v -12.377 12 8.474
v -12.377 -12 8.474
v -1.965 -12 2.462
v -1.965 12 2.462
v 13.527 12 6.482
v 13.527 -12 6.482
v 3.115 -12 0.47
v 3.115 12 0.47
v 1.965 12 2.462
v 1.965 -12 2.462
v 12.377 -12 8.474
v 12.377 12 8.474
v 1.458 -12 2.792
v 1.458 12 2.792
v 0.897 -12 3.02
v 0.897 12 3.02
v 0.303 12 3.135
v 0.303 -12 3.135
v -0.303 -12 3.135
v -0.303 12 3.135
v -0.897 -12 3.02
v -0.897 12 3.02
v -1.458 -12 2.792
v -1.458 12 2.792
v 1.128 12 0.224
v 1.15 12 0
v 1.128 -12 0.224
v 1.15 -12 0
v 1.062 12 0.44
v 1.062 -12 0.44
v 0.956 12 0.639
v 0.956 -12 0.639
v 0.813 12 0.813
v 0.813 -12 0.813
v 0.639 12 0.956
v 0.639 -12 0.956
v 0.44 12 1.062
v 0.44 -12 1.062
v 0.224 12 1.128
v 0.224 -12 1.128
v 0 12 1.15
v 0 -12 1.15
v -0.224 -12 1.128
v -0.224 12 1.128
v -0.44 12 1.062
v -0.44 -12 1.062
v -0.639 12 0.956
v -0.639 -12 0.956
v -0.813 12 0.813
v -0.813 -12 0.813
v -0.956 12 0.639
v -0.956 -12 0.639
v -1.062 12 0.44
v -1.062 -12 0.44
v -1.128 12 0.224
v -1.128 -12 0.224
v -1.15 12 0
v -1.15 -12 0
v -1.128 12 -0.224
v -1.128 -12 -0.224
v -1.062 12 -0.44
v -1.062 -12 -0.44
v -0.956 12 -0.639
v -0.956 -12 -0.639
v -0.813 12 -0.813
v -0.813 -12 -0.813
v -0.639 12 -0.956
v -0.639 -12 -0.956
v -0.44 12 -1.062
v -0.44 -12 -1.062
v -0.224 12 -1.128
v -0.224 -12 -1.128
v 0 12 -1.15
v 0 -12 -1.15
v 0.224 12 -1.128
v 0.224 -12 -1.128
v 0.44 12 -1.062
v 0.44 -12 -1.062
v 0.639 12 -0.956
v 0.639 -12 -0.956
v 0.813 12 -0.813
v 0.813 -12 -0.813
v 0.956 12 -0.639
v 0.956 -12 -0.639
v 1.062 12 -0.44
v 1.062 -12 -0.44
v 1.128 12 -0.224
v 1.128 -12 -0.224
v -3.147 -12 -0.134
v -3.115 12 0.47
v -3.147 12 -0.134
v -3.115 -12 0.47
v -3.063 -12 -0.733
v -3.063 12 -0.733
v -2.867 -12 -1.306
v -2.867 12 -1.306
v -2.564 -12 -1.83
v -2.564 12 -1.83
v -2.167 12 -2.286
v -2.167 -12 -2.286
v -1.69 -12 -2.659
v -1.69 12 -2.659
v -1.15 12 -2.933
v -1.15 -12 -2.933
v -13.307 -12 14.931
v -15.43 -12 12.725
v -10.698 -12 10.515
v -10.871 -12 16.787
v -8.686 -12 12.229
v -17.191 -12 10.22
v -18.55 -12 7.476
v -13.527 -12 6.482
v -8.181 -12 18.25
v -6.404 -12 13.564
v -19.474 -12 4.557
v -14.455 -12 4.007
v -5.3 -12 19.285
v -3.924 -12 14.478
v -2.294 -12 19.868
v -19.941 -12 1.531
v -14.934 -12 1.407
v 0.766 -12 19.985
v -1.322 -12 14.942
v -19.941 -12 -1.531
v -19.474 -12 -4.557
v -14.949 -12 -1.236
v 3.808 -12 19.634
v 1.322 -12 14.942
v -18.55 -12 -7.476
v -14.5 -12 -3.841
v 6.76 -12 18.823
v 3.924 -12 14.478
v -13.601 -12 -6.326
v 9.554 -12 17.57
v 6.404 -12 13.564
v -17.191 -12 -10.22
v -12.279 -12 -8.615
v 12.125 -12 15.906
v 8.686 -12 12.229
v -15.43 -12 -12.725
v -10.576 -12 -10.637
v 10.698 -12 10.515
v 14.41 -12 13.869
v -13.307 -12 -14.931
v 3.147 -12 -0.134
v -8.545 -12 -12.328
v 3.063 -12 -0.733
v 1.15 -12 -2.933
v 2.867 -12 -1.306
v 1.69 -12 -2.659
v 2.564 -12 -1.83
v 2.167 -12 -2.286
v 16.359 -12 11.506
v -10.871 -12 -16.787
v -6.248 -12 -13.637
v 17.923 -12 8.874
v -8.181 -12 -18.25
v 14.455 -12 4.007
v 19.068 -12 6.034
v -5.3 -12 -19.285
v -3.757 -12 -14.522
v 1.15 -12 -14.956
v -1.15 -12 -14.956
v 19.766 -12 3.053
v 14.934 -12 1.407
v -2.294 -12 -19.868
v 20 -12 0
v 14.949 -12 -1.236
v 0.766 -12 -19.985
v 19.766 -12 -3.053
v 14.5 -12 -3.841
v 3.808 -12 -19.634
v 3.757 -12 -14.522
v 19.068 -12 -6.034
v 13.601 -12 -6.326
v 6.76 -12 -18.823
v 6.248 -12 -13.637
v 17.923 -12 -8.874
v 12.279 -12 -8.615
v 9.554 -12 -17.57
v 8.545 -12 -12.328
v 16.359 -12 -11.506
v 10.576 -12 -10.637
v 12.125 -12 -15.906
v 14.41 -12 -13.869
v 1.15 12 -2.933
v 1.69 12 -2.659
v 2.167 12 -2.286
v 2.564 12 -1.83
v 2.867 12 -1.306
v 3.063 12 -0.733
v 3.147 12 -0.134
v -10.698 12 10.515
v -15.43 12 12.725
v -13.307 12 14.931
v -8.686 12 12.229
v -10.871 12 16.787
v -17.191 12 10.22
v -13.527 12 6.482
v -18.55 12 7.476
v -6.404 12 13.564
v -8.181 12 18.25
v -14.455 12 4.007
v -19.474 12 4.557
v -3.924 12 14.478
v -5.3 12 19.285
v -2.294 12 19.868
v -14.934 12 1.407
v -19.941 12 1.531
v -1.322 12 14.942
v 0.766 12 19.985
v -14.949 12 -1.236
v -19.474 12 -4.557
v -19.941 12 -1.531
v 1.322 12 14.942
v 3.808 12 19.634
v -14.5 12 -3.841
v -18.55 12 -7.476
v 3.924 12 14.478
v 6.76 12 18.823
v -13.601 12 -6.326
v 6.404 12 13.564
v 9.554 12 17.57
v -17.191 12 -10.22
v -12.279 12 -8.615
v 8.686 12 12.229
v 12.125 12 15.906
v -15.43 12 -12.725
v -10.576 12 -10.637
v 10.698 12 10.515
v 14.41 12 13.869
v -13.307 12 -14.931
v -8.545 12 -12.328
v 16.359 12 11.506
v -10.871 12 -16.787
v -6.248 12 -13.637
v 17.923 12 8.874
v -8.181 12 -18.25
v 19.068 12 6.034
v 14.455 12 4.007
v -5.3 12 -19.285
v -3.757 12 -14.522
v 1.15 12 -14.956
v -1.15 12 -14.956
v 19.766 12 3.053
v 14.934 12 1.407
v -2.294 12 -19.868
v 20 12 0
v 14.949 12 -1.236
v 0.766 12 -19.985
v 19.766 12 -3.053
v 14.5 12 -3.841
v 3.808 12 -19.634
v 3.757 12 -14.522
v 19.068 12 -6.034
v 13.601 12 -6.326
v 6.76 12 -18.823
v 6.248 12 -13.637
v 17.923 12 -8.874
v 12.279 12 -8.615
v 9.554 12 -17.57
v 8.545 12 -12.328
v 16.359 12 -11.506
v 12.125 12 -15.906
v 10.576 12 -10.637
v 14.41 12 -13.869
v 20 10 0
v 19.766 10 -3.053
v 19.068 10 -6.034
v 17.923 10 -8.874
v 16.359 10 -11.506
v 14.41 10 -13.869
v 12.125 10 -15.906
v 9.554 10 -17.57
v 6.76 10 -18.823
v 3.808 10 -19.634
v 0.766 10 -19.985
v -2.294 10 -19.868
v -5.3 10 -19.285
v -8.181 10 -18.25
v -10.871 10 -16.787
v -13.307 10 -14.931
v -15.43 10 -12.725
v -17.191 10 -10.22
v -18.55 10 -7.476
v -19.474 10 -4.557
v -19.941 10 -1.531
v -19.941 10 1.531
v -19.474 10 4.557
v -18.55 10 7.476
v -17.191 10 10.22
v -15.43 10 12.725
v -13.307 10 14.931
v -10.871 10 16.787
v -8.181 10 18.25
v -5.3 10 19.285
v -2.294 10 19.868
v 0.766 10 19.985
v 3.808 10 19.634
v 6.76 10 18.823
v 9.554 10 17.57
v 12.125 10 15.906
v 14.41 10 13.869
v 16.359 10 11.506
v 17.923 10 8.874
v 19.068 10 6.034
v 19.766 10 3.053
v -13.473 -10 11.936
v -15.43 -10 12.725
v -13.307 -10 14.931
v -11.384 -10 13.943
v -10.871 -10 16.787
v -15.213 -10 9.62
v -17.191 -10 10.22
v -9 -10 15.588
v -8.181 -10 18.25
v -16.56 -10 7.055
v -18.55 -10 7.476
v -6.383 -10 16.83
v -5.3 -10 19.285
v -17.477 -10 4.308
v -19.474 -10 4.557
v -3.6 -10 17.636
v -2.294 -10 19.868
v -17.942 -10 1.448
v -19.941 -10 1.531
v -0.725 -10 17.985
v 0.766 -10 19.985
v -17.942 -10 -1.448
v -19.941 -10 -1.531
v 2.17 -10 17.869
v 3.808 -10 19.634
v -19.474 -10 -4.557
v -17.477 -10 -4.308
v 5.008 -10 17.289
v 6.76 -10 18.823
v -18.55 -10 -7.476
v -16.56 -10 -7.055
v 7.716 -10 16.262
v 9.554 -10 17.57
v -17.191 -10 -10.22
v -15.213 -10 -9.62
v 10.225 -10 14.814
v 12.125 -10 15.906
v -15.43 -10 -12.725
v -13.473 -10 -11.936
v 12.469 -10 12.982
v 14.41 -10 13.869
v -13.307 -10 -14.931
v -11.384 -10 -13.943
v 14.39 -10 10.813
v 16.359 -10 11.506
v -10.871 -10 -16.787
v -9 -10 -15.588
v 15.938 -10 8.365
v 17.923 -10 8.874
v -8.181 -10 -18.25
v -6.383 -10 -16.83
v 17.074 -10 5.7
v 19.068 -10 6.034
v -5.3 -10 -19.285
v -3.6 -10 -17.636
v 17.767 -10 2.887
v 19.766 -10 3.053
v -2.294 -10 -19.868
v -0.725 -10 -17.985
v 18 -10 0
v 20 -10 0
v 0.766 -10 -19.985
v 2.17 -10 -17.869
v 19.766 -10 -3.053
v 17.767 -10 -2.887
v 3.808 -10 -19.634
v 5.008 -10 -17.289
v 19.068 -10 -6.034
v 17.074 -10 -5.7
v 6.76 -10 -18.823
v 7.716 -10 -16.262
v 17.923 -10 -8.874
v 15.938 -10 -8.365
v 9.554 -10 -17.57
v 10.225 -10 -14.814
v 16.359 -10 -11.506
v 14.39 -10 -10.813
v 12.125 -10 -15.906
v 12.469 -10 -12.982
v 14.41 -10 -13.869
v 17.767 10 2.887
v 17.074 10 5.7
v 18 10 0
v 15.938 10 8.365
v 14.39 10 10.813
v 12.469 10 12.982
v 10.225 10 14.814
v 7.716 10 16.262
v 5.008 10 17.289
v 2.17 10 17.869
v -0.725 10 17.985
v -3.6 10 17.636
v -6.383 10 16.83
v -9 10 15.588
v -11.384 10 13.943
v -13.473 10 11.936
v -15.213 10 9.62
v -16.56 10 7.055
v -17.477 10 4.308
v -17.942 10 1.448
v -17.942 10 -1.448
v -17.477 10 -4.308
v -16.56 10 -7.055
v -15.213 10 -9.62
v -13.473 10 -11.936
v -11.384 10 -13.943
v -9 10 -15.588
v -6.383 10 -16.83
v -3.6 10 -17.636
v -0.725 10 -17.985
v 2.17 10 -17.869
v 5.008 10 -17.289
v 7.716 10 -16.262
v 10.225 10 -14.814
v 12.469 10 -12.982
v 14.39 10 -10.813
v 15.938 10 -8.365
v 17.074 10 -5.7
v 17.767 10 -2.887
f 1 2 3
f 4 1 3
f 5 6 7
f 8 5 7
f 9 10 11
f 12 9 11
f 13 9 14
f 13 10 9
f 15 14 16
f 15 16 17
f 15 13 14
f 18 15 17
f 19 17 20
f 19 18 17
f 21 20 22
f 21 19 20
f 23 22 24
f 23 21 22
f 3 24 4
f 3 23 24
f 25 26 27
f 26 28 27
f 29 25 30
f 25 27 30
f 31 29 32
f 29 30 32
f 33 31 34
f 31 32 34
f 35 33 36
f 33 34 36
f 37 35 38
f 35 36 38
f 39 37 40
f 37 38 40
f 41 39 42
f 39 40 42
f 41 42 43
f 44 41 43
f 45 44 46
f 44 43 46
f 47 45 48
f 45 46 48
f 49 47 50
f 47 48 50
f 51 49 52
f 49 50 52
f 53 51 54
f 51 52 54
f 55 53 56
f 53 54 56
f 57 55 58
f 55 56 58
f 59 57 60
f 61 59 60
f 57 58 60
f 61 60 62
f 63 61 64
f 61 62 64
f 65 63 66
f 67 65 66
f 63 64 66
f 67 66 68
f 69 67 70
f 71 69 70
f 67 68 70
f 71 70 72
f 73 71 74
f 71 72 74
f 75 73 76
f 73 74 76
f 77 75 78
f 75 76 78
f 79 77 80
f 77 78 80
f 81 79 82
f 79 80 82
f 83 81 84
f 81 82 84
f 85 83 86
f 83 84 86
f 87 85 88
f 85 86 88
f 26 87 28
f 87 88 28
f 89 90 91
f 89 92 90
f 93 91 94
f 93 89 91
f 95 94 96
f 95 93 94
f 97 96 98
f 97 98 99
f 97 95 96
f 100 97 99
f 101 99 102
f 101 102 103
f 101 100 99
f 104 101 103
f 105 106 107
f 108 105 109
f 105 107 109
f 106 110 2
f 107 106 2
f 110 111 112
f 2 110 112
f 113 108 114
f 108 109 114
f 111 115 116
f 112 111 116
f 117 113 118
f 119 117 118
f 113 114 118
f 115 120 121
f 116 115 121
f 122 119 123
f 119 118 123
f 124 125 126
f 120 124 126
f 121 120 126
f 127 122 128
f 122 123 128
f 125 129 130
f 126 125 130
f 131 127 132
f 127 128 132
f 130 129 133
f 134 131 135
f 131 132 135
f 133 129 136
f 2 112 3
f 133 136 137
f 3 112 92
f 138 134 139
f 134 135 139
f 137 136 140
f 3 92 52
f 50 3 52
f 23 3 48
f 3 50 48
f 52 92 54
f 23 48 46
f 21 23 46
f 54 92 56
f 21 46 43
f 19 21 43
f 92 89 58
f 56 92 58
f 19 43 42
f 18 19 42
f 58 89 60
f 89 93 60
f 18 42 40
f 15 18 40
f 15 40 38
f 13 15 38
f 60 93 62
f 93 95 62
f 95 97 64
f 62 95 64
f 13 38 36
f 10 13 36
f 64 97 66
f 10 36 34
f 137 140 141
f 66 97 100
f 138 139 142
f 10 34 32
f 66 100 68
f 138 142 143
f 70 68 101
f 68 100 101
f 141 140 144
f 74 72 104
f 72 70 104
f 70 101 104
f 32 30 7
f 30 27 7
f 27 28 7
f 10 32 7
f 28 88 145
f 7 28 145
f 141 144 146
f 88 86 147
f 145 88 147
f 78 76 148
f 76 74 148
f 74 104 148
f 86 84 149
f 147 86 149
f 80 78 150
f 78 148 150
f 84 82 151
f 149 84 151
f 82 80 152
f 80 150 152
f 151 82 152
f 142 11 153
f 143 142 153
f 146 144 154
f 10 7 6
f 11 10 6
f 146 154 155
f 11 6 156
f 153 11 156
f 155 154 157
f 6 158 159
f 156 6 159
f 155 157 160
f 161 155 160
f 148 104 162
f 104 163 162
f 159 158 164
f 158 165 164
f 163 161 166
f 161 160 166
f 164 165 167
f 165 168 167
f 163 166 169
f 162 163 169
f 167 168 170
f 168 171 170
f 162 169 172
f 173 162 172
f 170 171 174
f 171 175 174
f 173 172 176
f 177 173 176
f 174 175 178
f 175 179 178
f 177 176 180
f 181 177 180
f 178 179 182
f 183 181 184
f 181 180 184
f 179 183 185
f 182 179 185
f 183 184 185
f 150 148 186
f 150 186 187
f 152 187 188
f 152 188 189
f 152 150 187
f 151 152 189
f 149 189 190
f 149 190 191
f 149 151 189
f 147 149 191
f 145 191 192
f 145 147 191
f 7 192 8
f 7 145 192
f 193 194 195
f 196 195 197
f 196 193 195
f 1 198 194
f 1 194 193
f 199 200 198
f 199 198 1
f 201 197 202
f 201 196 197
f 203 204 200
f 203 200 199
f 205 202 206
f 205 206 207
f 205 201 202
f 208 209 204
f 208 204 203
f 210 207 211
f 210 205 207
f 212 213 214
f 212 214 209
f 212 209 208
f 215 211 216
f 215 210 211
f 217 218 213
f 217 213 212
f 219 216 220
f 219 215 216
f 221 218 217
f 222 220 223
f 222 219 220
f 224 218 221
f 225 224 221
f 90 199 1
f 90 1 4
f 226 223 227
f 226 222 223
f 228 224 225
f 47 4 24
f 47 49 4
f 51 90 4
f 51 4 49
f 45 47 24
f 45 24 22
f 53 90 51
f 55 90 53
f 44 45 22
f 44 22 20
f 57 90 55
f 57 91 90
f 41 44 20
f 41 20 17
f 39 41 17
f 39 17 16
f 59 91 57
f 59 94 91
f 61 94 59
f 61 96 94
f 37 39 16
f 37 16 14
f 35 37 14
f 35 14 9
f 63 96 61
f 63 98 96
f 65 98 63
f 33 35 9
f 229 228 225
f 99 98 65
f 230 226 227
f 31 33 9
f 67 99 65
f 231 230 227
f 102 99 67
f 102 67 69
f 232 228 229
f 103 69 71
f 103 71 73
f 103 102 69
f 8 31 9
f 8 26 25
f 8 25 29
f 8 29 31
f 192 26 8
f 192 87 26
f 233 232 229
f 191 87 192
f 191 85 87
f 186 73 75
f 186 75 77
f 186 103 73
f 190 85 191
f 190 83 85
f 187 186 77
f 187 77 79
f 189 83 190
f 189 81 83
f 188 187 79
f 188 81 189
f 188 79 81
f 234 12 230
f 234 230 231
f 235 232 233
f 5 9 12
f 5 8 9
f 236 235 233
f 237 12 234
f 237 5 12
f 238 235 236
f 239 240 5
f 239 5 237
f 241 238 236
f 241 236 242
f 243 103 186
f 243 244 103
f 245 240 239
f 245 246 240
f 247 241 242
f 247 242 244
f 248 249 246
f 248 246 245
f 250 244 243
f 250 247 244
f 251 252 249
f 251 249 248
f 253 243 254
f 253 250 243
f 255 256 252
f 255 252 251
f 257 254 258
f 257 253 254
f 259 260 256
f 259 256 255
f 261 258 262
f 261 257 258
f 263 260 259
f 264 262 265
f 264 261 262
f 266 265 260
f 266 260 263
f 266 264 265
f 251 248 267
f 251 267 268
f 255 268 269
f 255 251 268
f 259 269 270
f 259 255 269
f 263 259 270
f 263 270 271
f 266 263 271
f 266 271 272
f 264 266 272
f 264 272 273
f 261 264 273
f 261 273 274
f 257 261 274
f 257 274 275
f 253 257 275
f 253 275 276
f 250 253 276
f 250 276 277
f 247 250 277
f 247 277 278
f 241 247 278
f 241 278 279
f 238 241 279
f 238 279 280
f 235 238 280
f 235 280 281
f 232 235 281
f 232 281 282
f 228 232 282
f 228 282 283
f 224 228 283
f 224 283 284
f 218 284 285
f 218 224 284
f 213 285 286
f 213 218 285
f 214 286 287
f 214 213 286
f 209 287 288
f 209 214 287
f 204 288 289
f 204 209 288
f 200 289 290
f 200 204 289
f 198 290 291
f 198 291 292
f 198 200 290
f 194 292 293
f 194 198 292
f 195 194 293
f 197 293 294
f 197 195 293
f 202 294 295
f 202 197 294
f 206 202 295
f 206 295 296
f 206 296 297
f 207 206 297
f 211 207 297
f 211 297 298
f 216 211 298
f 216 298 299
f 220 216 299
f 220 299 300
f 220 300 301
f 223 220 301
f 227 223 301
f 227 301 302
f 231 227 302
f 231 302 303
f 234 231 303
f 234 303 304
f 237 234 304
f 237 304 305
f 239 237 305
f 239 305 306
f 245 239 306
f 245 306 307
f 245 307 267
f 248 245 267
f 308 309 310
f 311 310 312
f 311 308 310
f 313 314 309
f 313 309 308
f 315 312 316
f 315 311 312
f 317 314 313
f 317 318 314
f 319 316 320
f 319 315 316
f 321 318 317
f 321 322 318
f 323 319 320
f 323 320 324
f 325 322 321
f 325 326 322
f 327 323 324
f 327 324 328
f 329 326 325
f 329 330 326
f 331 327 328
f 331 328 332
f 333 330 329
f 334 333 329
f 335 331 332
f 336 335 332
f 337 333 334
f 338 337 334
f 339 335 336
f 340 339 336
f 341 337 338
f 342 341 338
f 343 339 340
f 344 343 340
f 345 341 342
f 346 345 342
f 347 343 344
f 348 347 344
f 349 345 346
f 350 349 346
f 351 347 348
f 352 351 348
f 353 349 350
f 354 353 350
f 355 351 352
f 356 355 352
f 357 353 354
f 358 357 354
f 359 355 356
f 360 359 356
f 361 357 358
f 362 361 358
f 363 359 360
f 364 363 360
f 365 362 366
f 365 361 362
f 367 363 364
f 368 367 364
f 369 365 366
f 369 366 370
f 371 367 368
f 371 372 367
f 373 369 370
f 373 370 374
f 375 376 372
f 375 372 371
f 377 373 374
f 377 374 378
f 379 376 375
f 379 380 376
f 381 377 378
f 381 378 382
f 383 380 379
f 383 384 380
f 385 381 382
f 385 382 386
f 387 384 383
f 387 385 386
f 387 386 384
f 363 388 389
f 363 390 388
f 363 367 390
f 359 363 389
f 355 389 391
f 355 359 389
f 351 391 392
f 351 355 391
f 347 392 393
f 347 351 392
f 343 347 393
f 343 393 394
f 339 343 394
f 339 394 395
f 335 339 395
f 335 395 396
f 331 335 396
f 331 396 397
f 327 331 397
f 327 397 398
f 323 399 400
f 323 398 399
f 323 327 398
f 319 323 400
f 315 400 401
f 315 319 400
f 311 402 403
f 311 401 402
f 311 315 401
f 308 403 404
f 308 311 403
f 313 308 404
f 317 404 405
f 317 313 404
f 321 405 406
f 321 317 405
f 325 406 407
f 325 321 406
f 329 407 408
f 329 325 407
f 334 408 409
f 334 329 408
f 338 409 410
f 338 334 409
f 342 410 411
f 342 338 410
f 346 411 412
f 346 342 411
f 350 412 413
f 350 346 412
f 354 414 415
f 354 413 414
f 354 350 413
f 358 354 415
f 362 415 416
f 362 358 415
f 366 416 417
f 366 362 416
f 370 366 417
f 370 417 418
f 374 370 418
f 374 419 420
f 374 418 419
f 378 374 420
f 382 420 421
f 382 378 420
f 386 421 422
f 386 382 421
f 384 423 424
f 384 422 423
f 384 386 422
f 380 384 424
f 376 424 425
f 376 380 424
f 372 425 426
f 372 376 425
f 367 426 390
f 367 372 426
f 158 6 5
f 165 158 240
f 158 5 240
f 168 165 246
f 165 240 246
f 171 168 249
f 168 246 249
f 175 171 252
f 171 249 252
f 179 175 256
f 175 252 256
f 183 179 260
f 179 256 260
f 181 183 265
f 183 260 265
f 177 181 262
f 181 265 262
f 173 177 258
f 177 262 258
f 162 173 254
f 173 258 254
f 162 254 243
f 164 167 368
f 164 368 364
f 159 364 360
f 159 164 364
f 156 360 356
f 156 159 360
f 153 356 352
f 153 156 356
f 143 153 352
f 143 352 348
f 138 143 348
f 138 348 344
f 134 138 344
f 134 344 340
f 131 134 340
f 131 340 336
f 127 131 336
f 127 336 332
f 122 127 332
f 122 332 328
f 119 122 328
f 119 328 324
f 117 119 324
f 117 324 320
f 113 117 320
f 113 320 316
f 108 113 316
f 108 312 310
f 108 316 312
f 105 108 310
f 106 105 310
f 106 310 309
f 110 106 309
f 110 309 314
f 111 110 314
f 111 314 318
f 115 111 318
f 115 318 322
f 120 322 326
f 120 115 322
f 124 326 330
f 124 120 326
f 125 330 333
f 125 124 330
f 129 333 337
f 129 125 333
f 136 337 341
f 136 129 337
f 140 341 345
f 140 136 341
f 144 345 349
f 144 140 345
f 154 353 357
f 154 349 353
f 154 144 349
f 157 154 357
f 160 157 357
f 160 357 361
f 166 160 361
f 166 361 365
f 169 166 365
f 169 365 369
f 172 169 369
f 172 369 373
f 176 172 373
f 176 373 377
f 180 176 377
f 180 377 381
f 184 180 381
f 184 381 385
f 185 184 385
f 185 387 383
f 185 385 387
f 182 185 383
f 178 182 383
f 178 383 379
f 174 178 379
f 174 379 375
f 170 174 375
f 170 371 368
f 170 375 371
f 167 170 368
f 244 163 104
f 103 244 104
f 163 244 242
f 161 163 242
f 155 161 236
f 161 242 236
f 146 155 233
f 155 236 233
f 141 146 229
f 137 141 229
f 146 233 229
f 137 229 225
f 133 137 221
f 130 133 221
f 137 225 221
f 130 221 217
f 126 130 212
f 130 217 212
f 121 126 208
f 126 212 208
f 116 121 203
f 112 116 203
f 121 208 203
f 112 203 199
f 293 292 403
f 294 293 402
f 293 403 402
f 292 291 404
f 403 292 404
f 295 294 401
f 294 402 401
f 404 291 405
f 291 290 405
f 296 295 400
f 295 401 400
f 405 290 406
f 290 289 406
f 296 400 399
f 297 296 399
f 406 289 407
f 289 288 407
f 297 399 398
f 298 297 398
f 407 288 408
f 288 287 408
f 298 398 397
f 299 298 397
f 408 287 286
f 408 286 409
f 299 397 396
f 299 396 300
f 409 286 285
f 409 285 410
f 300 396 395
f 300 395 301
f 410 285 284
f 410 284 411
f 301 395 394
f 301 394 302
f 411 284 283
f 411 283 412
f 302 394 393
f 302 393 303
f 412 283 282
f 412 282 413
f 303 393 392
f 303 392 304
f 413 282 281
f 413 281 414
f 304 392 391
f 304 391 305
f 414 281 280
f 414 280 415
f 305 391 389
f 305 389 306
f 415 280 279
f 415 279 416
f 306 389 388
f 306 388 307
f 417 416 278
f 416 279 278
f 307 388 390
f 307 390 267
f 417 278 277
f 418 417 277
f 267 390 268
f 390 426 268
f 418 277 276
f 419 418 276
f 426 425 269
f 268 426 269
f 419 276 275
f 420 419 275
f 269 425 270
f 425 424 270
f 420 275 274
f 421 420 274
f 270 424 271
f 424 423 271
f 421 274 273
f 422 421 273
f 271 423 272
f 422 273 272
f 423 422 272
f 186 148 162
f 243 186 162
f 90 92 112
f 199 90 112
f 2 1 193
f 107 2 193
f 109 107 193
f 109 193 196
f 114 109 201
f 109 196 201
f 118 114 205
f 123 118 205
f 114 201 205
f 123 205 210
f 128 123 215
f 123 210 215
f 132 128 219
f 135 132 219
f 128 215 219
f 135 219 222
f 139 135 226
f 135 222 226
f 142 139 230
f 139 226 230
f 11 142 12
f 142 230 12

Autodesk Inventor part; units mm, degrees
ref_plane "YZ Plane" through (0, 0, 0) normal (1, 0, 0) x (0, 1, 0)
ref_plane "XZ Plane" through (0, 0, 0) normal (0, 1, 0) x (-1, 0, 0)
ref_plane "XY Plane" through (0, 0, 0) normal (0, 0, 1) x (1, 0, 0)
sketch "Эскиз1" plane through (0, 0, 0) normal (0, 0, 1) x (1, 0, 0)
  line L0 (0, 0) -> (15, 0)
  line L1 (15, 0) -> (15, 10)
  line L2 (15, 10) -> (15, -10)
  line L3 (15, 10) -> (18, 10)
  line L4 (18, 10) -> (18, -10)
  line L5 (18, -10) -> (15, -10)
  line L6 (15, -10) -> (15, 10)
  line L7 (15, 10) -> (20, 10)
  line L8 (20, 10) -> (20, 12)
  line L9 (20, 12) -> (15, 12)
  line L10 (15, 12) -> (15, 10)
  line L11 (15, -10) -> (20, -10)
  line L12 (20, -10) -> (20, -12)
  line L13 (20, -12) -> (15, -12)
  line L14 (15, -12) -> (15, -10)
  line L15 (0, 0) -> (0, 10)
  dimension "d0" = 15
  dimension "d1" = 10
  dimension "d2" = 20
  dimension "d3" = 3
  dimension "d4" = 5
  dimension "d5" = 2
  dimension "d6" = 5
  dimension "d7" = 2
revolve "Вращение1" add sketch "Эскиз1" angle 360 about axis through (0, 0, 0) along (0, 1, 0)
sketch "Эскиз2" plane through (0, -12, 0) normal (0, -1, 0) x (1, 0, 0)
  circle A0 centre (0, 0) radius 1.15
  circle A1 centre (0, 0) radius 3.15
  circle A2 centre (0, 0) radius 15 projected
  line L0 (-1.15, 0) -> (1.15, 0)
  line L1 (1.15, 0) -> (1.15, -15.6419)
  line L2 (1.15, -15.6419) -> (-1.15, -15.6419)
  line L3 (-1.15, -15.6419) -> (-1.15, 0)
  line L4 (14.1213, 6.825) -> (0.575, -0.9959)
  line L5 (-0.575, 0.9959) -> (12.9713, 8.8169)
  line L6 (12.9713, 8.8169) -> (14.1213, 6.825)
  line L7 (0.575, -0.9959) -> (-0.575, 0.9959)
  line L8 (-12.9713, 8.8169) -> (0.575, 0.9959)
  line L9 (-0.575, -0.9959) -> (-14.1213, 6.825)
  line L10 (-14.1213, 6.825) -> (-12.9713, 8.8169)
  line L11 (0.575, 0.9959) -> (-0.575, -0.9959)
  dimension "d9" = 2.3
  dimension "d10" = 2
  dimension "d13" = 360
extrude "Выдавливание1" add sketch "Эскиз2" against normal up to surface (24 mm away) contours L0 L11 A0 | L1 L4 A0 | A0 L7 L0 | A0 L8 L5 A1 L4 L1 | L11 L7 A0 | A0 L5 L8 | L4 L1 A1 L3 L9 A0 | A0 L11 L7 | L11 A0 L0 | L0 A0 L7 | L4 A1 L1 | A0 L3 L9 A1 L8 L5 | L8 A1 L5 | L9 L3 A0 | L1 A2 L3 A1 | A1 L5 A2 L4 | A1 L9 A2 L8 | L3 A1 L9 | L1 L2 L3 A2 | A2 L5 L6 L4 | A2 L9 L10 L8
extrude "Выдавливание2" cut sketch "Эскиз2" against normal up to surface (24 mm away) contours L0 L11 A0 | A0 L7 L0 | L11 L7 A0 | A0 L11 L7 | L11 A0 L0 | L0 A0 L7
properties part number "Wheel down"
